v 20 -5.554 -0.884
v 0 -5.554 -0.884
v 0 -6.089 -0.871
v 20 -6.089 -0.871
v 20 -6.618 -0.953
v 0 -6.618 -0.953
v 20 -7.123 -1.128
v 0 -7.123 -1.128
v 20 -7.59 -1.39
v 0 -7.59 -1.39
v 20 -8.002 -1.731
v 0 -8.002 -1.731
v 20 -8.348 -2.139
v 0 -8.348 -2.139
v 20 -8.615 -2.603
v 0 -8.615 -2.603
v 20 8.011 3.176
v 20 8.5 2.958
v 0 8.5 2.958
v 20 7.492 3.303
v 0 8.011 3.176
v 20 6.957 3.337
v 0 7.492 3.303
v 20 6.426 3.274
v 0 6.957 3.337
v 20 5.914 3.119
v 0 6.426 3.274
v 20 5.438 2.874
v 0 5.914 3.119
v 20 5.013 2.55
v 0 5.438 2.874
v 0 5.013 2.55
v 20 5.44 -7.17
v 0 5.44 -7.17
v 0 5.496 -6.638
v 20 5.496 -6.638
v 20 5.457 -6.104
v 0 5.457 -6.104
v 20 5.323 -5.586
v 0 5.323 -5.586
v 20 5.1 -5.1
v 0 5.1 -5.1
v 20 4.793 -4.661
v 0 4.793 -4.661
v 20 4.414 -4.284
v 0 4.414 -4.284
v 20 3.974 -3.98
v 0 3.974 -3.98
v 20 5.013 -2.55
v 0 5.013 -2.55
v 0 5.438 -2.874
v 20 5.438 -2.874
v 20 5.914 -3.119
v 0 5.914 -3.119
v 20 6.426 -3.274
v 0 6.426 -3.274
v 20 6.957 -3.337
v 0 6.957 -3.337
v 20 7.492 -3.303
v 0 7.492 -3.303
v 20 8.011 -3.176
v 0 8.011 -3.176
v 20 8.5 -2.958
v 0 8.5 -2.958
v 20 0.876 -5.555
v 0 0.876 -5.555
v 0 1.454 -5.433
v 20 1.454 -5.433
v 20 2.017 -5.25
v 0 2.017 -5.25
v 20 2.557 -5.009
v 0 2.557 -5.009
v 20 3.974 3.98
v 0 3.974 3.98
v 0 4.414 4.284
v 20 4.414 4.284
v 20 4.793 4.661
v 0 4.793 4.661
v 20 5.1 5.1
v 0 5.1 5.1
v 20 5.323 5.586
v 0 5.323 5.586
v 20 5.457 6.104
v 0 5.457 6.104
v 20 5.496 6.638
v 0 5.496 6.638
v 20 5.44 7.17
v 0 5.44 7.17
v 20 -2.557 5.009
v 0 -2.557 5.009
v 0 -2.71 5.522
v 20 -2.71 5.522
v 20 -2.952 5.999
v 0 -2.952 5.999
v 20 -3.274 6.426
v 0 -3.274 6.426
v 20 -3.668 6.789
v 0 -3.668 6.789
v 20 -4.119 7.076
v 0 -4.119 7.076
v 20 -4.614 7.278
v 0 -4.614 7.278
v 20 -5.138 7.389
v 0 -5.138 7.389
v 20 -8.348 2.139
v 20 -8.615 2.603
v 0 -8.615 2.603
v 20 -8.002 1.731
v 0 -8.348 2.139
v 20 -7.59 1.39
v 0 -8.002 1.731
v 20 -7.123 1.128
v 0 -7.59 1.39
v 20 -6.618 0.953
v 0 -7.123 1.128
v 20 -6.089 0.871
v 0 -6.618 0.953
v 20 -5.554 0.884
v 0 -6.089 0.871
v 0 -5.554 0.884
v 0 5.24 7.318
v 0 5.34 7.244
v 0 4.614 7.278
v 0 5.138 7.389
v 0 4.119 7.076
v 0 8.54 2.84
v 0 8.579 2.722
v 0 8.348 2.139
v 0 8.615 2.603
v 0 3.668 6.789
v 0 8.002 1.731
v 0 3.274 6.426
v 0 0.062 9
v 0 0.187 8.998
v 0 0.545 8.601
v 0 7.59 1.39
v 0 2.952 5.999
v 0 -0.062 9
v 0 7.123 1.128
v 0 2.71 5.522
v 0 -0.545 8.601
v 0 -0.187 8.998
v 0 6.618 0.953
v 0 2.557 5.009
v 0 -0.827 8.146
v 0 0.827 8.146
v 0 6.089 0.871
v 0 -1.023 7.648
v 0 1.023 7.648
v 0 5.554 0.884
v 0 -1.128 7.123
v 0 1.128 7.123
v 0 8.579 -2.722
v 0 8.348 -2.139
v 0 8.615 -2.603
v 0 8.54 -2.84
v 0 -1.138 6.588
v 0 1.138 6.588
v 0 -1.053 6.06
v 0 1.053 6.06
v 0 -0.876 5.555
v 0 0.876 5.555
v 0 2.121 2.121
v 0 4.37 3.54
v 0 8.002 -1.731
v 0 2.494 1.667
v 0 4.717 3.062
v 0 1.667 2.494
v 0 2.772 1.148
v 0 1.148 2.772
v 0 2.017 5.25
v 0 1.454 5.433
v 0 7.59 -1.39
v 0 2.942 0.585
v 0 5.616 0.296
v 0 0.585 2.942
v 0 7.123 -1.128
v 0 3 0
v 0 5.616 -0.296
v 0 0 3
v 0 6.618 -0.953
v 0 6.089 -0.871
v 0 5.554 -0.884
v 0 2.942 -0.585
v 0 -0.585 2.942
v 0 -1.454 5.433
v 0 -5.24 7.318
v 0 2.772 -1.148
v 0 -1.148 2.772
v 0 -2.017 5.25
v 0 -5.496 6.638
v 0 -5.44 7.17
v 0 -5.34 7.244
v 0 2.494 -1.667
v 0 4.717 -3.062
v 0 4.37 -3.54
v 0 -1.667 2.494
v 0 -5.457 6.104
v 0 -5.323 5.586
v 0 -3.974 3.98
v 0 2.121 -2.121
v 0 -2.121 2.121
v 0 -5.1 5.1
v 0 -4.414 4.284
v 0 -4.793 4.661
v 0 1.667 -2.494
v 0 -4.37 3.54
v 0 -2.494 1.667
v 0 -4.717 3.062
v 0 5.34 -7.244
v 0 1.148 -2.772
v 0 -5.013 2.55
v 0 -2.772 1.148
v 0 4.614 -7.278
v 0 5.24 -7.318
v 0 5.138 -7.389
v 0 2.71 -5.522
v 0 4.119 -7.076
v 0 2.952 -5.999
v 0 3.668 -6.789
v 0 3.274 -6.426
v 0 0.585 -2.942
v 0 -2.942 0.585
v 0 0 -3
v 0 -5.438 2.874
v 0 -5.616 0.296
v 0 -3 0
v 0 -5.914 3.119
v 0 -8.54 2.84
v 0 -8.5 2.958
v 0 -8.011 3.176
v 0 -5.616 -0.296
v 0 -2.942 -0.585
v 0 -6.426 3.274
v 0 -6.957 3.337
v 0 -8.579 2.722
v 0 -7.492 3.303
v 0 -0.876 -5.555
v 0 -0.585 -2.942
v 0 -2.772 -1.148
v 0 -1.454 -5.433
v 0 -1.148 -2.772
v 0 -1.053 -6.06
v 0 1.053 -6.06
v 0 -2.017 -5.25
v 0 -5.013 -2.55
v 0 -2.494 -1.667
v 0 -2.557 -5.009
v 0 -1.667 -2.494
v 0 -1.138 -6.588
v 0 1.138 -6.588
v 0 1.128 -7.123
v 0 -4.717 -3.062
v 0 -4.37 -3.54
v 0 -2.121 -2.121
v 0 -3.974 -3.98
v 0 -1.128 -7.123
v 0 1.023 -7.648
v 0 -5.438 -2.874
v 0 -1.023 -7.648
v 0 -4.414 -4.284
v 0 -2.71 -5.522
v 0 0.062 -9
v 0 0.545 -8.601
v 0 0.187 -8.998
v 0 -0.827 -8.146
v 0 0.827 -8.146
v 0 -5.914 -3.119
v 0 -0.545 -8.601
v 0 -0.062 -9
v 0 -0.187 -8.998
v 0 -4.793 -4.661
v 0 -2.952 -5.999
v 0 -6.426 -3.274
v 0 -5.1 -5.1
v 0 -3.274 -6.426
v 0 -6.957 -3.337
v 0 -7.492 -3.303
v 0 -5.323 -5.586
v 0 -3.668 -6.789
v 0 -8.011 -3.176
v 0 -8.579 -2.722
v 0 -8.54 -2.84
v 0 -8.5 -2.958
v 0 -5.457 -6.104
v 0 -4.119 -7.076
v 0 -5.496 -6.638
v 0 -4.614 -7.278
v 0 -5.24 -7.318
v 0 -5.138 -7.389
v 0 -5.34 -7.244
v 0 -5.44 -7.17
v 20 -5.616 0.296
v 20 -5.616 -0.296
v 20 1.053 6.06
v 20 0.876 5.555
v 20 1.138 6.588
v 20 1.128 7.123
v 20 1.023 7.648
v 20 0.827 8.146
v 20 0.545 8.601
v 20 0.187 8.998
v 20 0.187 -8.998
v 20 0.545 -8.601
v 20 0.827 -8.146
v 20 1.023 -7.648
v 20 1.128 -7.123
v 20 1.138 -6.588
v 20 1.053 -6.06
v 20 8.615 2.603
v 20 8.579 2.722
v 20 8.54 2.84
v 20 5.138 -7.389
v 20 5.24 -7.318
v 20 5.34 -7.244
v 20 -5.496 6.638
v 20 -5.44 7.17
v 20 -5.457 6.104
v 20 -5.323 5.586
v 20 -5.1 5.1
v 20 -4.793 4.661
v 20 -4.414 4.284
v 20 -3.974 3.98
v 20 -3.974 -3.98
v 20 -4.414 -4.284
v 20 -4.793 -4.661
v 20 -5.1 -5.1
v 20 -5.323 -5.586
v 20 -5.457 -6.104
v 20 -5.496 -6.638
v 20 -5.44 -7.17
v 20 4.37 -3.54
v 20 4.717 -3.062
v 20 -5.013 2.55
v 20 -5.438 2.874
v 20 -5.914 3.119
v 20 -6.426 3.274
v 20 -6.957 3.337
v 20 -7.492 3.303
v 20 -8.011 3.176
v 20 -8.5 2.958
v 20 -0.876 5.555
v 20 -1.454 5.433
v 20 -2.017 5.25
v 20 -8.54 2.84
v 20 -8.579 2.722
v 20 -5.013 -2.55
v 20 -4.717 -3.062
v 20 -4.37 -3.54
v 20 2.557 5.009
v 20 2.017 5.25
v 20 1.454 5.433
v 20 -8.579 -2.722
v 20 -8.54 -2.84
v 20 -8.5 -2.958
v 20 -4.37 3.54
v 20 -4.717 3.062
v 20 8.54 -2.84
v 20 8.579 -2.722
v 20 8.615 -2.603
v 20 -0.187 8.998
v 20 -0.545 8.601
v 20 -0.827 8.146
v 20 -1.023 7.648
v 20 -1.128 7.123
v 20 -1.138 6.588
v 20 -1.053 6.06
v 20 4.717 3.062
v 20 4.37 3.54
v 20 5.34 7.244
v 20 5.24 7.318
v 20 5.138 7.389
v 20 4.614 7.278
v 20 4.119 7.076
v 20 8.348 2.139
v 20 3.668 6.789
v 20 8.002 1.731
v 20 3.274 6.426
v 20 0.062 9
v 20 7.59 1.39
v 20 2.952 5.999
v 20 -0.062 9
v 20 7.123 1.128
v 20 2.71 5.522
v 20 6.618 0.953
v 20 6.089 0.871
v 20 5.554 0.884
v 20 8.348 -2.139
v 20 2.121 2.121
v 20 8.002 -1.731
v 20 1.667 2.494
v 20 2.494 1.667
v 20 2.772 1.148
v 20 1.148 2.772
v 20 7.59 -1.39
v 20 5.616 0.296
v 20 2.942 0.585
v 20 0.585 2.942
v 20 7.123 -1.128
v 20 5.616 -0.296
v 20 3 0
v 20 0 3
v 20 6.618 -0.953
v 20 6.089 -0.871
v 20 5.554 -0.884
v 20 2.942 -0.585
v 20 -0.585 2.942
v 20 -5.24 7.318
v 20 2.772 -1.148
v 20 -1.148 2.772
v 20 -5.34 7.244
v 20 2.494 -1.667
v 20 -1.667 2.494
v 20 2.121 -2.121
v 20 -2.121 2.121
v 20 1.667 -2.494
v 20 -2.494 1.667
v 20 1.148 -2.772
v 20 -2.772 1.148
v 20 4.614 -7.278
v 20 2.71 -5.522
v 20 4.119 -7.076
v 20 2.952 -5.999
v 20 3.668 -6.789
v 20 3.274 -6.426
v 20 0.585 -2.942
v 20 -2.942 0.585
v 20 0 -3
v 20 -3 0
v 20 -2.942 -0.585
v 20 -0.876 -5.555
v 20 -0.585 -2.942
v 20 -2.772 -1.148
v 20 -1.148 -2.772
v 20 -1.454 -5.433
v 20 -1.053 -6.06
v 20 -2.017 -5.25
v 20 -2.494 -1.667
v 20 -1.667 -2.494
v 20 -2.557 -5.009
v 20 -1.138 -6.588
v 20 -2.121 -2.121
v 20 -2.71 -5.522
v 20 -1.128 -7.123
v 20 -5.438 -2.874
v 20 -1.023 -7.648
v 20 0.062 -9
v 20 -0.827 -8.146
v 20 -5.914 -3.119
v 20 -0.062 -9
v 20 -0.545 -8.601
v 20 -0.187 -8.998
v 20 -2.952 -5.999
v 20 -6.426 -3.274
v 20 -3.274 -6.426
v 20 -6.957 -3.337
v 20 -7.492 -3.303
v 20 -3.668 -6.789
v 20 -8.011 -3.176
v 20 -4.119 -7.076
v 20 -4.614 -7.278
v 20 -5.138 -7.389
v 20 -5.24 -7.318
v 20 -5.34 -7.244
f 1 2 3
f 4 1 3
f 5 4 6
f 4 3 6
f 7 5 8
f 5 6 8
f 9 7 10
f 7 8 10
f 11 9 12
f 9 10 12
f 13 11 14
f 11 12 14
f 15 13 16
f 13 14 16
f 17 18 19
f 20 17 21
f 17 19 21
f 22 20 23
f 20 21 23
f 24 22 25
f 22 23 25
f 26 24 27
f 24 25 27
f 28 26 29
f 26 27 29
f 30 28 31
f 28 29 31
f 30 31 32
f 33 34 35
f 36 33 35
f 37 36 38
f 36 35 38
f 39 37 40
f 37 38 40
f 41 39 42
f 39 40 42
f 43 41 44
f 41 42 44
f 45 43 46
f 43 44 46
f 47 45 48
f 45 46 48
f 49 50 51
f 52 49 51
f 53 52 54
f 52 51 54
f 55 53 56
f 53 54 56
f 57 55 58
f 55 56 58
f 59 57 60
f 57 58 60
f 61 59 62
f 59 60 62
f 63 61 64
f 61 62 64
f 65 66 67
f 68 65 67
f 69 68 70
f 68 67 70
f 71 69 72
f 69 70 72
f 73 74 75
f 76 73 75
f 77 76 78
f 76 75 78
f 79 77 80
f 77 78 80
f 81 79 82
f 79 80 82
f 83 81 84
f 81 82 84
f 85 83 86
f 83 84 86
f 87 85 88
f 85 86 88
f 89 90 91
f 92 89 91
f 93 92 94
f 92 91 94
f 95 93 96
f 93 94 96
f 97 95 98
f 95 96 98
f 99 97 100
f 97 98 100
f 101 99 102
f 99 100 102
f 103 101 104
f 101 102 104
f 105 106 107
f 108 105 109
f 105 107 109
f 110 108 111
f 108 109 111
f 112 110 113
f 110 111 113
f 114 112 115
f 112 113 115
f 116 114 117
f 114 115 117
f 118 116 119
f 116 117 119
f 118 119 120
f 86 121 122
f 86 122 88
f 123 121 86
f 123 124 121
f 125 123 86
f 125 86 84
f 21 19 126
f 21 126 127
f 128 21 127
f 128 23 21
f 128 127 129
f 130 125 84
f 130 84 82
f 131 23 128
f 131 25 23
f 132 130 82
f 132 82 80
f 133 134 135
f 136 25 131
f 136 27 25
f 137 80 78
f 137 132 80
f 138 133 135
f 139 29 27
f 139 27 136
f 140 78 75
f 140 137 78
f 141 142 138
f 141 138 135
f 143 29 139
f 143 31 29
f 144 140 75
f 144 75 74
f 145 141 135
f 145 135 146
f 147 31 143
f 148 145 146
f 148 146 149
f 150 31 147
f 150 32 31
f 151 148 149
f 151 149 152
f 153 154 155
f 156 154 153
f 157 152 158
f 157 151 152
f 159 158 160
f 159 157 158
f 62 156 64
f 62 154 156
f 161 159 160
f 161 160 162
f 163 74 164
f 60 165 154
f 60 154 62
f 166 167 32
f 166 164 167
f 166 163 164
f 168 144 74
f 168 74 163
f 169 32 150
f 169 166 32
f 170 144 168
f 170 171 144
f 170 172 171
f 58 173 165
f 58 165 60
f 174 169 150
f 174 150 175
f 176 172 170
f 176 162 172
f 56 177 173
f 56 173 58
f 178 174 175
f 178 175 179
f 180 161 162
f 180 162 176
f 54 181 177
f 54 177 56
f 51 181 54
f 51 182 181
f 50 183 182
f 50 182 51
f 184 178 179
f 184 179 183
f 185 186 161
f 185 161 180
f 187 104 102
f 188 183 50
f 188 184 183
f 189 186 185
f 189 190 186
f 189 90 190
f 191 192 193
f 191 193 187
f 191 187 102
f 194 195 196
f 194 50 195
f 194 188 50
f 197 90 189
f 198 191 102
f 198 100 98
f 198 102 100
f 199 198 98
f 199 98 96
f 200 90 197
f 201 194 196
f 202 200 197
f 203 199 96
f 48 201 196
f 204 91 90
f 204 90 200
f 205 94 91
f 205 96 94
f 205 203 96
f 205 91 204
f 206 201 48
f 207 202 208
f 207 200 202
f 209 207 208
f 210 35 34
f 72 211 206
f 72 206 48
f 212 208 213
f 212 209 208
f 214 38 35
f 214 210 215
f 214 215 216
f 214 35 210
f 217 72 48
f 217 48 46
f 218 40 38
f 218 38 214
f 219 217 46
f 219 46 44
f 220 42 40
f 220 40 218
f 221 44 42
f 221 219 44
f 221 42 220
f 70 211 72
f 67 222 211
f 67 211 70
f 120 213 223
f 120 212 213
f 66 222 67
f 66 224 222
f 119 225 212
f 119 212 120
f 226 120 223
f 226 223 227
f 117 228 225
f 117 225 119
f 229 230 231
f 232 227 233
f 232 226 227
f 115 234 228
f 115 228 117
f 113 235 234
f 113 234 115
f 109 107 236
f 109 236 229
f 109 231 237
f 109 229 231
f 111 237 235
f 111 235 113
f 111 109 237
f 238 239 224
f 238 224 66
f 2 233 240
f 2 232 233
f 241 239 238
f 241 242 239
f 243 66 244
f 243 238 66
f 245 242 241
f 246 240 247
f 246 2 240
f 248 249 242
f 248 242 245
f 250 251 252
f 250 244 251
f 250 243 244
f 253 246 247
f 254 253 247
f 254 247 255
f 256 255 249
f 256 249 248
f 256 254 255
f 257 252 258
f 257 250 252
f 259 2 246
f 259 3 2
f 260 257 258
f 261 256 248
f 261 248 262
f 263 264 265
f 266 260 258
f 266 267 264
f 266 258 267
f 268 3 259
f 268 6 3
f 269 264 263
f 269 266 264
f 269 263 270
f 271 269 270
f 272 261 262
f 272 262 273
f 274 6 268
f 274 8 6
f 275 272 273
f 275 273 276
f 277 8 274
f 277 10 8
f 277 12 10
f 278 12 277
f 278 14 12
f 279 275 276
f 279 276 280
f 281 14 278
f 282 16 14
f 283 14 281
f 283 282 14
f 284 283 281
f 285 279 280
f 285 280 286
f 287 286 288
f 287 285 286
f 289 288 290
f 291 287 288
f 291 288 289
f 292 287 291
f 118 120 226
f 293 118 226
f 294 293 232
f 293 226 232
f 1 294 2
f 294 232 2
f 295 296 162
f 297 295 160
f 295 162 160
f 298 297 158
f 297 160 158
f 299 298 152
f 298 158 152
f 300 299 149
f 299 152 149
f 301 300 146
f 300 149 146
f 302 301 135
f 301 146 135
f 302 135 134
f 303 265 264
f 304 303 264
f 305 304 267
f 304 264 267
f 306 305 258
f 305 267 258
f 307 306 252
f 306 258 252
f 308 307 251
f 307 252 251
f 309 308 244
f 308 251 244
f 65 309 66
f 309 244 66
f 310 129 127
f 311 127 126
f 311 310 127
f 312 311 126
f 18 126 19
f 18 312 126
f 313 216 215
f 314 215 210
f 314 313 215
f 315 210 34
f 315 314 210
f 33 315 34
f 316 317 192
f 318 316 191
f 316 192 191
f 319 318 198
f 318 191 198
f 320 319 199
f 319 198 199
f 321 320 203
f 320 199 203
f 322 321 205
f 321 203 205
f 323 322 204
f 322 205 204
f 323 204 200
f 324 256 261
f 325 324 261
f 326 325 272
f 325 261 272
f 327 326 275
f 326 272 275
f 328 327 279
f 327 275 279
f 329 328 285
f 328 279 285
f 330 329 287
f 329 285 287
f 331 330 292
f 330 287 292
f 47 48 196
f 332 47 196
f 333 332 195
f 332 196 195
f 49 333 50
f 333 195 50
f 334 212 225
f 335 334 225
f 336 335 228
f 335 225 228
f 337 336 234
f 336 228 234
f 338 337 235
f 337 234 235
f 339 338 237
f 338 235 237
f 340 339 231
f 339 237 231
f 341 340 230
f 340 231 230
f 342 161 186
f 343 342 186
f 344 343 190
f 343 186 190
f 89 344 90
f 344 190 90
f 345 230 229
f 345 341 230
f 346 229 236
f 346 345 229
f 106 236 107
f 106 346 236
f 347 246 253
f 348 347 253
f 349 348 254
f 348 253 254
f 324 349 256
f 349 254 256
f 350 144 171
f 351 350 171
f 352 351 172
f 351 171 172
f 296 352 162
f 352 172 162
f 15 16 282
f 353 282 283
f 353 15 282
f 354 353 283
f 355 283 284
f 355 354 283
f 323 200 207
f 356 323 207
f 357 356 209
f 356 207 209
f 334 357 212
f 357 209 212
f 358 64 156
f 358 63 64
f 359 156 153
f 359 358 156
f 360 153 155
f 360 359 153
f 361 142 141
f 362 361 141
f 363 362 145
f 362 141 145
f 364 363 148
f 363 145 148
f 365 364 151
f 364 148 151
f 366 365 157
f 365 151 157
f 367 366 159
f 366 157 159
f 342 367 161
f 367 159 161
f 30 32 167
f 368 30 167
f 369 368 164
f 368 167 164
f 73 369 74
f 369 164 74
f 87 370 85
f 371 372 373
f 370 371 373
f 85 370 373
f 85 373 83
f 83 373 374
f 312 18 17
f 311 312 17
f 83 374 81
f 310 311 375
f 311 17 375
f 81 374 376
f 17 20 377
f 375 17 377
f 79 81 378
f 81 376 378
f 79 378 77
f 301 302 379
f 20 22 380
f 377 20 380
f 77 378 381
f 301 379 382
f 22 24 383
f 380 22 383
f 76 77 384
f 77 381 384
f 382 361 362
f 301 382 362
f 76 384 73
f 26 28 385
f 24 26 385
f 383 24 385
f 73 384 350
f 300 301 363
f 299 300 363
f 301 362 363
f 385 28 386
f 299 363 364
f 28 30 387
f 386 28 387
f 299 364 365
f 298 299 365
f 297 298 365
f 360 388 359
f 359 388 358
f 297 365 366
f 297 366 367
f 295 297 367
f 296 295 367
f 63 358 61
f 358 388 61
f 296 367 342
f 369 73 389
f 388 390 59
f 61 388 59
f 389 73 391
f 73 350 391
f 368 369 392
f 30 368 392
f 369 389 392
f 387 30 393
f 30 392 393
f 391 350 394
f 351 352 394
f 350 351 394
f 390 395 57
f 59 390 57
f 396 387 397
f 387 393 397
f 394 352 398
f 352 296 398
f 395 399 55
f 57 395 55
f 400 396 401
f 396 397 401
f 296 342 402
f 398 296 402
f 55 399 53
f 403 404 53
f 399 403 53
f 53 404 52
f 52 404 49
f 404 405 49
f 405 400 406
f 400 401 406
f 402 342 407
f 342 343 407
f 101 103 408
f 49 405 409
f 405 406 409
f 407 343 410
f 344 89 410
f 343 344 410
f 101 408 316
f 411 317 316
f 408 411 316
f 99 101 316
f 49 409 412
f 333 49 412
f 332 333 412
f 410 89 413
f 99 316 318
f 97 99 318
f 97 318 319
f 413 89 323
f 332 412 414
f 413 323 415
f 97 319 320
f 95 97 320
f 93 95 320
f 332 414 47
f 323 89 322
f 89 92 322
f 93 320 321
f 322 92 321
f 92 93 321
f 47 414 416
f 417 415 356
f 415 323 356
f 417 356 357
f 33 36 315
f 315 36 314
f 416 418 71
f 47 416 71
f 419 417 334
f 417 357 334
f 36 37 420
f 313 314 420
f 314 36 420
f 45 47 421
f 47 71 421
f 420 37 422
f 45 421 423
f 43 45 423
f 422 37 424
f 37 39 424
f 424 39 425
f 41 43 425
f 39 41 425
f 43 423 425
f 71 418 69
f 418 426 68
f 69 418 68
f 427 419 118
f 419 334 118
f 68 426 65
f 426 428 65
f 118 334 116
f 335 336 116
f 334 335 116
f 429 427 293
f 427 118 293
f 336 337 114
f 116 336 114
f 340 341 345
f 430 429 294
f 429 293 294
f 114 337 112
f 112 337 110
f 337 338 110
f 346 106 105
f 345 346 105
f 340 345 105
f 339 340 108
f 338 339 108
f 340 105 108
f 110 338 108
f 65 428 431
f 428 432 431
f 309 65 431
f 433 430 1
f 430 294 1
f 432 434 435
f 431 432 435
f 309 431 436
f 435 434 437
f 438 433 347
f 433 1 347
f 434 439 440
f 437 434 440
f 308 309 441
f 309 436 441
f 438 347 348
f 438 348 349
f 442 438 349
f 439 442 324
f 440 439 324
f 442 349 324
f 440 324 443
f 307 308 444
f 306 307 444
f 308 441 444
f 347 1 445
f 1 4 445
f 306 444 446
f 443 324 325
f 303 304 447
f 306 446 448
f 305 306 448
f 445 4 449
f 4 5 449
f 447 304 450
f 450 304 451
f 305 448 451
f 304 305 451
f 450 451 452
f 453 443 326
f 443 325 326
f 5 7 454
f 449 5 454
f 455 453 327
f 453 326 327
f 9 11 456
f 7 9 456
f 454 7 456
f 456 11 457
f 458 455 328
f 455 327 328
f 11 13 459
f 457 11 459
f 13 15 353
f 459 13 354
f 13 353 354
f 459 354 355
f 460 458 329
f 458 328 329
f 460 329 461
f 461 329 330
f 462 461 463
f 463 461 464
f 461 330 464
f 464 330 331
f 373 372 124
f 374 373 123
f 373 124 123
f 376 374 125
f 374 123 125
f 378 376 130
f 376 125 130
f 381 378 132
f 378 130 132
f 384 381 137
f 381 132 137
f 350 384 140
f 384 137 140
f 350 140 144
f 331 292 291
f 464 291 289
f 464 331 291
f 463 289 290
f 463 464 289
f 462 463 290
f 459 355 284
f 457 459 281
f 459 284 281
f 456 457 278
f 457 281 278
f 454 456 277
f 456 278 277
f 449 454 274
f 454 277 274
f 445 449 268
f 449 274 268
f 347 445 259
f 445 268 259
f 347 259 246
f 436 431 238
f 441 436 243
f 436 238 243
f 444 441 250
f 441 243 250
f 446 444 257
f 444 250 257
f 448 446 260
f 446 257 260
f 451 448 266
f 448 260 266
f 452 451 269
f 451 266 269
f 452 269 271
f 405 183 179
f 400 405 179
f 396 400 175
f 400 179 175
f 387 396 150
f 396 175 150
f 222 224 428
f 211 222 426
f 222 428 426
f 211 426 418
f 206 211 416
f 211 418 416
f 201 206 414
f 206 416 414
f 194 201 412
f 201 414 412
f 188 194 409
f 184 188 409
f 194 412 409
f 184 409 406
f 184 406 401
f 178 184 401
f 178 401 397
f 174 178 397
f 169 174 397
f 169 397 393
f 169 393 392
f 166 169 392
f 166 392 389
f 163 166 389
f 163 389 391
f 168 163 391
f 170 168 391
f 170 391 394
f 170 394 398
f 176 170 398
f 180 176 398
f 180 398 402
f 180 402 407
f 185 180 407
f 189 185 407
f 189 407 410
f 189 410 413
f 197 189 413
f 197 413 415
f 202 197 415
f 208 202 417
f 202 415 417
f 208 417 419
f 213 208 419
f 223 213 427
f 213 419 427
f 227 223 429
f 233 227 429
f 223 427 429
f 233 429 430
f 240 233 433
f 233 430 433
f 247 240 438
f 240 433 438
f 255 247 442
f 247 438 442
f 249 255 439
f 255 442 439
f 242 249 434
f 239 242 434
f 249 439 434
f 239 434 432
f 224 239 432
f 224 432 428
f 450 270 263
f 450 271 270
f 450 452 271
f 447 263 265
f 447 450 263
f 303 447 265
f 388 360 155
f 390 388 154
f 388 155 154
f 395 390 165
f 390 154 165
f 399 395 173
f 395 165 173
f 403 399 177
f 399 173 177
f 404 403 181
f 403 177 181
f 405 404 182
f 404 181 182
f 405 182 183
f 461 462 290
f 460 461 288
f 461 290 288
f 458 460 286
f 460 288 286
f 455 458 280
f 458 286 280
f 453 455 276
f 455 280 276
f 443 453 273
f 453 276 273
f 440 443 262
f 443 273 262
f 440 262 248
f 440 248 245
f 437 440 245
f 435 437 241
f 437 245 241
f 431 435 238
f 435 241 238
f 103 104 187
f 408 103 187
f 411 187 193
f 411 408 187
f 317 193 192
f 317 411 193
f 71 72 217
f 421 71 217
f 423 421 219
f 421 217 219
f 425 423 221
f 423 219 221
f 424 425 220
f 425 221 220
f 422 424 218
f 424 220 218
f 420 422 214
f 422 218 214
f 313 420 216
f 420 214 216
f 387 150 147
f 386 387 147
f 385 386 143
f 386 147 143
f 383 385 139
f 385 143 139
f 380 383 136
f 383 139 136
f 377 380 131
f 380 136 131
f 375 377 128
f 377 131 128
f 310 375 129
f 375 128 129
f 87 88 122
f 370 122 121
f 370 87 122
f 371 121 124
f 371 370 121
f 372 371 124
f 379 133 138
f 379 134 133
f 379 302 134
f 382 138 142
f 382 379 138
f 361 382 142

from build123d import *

# Parameters (mm, degrees)
BASPROSKE_W           = 20
BASPROSKE_H           = 9
TOOTHCUT_DEPTH        = 24.706539182
TEETHCUTS_COUNT       = 10
TEETHCUTS_ANGLE       = 324
BORSKE_R              = 2.5
BORE_DEPTH            = 50.0000508
IZIM1_R               = 3
KES_EKSTR_ZYON1_DEPTH = 26


with BuildPart() as part:
    # BasProSke → Base-Revolve (revolve)
    with BuildSketch(Plane(origin=(0, 0, 0), x_dir=(1, 0, 0), z_dir=(0, 1, 0)), mode=Mode.PRIVATE) as base_revolve_sk:
        with Locations((10, 4.5)):
            Rectangle(BASPROSKE_W, BASPROSKE_H)
    revolve(base_revolve_sk.sketch.rotate(Axis((-10, 0, 0), (1, 0, 0)), 180), axis=Axis((-10, 0, 0), (1, 0, 0)))

    # TooCutSke → ToothCut (cut, through all)
    with BuildSketch(Plane(origin=(0, 0, 0), x_dir=(0, 0, -1), z_dir=(1, 0, 0))):
        with BuildLine():
            ThreePointArc((0.883878355, 5.554109745), (0, 5.624), (-0.883878355, 5.554109745))
            ThreePointArc((-0.883878355, 5.554109745), (-1.258245767, 7.379188248), (-2.637816971, 8.631324741))
            ThreePointArc((-2.637816971, 8.631324741), (0, 9.0254), (2.637816971, 8.631324741))
            ThreePointArc((2.637816971, 8.631324741), (1.258245767, 7.379188248), (0.883878355, 5.554109745))
        make_face()
    toothcut = extrude(amount=TOOTHCUT_DEPTH, mode=Mode.SUBTRACT)

    # TeethCuts: ToothCut ×10 about axis
    teethcuts_axis = Axis((-10, 0, 0), (1, 0, 0))
    for i in range(1, TEETHCUTS_COUNT):
        add(toothcut.rotate(teethcuts_axis, i * TEETHCUTS_ANGLE / (TEETHCUTS_COUNT - 1)), mode=Mode.SUBTRACT)

    # BorSke → Bore (cut, symmetric)
    with BuildSketch(Plane(origin=(0, 0, 0), x_dir=(0, 0, -1), z_dir=(1, 0, 0))):
        with Locations(Location((0, 0, 0), (0, 0, 180))):
            Circle(BORSKE_R)
    extrude(amount=BORE_DEPTH, both=True, mode=Mode.SUBTRACT)

    # Çizim1 → Kes-Ekstrüzyon1 (cut)
    with BuildSketch(Plane(origin=(20, 0, 0), x_dir=(0, 0, -1), z_dir=(1, 0, 0))):
        Circle(IZIM1_R)
    extrude(amount=-KES_EKSTR_ZYON1_DEPTH, mode=Mode.SUBTRACT)


solid = part.part
